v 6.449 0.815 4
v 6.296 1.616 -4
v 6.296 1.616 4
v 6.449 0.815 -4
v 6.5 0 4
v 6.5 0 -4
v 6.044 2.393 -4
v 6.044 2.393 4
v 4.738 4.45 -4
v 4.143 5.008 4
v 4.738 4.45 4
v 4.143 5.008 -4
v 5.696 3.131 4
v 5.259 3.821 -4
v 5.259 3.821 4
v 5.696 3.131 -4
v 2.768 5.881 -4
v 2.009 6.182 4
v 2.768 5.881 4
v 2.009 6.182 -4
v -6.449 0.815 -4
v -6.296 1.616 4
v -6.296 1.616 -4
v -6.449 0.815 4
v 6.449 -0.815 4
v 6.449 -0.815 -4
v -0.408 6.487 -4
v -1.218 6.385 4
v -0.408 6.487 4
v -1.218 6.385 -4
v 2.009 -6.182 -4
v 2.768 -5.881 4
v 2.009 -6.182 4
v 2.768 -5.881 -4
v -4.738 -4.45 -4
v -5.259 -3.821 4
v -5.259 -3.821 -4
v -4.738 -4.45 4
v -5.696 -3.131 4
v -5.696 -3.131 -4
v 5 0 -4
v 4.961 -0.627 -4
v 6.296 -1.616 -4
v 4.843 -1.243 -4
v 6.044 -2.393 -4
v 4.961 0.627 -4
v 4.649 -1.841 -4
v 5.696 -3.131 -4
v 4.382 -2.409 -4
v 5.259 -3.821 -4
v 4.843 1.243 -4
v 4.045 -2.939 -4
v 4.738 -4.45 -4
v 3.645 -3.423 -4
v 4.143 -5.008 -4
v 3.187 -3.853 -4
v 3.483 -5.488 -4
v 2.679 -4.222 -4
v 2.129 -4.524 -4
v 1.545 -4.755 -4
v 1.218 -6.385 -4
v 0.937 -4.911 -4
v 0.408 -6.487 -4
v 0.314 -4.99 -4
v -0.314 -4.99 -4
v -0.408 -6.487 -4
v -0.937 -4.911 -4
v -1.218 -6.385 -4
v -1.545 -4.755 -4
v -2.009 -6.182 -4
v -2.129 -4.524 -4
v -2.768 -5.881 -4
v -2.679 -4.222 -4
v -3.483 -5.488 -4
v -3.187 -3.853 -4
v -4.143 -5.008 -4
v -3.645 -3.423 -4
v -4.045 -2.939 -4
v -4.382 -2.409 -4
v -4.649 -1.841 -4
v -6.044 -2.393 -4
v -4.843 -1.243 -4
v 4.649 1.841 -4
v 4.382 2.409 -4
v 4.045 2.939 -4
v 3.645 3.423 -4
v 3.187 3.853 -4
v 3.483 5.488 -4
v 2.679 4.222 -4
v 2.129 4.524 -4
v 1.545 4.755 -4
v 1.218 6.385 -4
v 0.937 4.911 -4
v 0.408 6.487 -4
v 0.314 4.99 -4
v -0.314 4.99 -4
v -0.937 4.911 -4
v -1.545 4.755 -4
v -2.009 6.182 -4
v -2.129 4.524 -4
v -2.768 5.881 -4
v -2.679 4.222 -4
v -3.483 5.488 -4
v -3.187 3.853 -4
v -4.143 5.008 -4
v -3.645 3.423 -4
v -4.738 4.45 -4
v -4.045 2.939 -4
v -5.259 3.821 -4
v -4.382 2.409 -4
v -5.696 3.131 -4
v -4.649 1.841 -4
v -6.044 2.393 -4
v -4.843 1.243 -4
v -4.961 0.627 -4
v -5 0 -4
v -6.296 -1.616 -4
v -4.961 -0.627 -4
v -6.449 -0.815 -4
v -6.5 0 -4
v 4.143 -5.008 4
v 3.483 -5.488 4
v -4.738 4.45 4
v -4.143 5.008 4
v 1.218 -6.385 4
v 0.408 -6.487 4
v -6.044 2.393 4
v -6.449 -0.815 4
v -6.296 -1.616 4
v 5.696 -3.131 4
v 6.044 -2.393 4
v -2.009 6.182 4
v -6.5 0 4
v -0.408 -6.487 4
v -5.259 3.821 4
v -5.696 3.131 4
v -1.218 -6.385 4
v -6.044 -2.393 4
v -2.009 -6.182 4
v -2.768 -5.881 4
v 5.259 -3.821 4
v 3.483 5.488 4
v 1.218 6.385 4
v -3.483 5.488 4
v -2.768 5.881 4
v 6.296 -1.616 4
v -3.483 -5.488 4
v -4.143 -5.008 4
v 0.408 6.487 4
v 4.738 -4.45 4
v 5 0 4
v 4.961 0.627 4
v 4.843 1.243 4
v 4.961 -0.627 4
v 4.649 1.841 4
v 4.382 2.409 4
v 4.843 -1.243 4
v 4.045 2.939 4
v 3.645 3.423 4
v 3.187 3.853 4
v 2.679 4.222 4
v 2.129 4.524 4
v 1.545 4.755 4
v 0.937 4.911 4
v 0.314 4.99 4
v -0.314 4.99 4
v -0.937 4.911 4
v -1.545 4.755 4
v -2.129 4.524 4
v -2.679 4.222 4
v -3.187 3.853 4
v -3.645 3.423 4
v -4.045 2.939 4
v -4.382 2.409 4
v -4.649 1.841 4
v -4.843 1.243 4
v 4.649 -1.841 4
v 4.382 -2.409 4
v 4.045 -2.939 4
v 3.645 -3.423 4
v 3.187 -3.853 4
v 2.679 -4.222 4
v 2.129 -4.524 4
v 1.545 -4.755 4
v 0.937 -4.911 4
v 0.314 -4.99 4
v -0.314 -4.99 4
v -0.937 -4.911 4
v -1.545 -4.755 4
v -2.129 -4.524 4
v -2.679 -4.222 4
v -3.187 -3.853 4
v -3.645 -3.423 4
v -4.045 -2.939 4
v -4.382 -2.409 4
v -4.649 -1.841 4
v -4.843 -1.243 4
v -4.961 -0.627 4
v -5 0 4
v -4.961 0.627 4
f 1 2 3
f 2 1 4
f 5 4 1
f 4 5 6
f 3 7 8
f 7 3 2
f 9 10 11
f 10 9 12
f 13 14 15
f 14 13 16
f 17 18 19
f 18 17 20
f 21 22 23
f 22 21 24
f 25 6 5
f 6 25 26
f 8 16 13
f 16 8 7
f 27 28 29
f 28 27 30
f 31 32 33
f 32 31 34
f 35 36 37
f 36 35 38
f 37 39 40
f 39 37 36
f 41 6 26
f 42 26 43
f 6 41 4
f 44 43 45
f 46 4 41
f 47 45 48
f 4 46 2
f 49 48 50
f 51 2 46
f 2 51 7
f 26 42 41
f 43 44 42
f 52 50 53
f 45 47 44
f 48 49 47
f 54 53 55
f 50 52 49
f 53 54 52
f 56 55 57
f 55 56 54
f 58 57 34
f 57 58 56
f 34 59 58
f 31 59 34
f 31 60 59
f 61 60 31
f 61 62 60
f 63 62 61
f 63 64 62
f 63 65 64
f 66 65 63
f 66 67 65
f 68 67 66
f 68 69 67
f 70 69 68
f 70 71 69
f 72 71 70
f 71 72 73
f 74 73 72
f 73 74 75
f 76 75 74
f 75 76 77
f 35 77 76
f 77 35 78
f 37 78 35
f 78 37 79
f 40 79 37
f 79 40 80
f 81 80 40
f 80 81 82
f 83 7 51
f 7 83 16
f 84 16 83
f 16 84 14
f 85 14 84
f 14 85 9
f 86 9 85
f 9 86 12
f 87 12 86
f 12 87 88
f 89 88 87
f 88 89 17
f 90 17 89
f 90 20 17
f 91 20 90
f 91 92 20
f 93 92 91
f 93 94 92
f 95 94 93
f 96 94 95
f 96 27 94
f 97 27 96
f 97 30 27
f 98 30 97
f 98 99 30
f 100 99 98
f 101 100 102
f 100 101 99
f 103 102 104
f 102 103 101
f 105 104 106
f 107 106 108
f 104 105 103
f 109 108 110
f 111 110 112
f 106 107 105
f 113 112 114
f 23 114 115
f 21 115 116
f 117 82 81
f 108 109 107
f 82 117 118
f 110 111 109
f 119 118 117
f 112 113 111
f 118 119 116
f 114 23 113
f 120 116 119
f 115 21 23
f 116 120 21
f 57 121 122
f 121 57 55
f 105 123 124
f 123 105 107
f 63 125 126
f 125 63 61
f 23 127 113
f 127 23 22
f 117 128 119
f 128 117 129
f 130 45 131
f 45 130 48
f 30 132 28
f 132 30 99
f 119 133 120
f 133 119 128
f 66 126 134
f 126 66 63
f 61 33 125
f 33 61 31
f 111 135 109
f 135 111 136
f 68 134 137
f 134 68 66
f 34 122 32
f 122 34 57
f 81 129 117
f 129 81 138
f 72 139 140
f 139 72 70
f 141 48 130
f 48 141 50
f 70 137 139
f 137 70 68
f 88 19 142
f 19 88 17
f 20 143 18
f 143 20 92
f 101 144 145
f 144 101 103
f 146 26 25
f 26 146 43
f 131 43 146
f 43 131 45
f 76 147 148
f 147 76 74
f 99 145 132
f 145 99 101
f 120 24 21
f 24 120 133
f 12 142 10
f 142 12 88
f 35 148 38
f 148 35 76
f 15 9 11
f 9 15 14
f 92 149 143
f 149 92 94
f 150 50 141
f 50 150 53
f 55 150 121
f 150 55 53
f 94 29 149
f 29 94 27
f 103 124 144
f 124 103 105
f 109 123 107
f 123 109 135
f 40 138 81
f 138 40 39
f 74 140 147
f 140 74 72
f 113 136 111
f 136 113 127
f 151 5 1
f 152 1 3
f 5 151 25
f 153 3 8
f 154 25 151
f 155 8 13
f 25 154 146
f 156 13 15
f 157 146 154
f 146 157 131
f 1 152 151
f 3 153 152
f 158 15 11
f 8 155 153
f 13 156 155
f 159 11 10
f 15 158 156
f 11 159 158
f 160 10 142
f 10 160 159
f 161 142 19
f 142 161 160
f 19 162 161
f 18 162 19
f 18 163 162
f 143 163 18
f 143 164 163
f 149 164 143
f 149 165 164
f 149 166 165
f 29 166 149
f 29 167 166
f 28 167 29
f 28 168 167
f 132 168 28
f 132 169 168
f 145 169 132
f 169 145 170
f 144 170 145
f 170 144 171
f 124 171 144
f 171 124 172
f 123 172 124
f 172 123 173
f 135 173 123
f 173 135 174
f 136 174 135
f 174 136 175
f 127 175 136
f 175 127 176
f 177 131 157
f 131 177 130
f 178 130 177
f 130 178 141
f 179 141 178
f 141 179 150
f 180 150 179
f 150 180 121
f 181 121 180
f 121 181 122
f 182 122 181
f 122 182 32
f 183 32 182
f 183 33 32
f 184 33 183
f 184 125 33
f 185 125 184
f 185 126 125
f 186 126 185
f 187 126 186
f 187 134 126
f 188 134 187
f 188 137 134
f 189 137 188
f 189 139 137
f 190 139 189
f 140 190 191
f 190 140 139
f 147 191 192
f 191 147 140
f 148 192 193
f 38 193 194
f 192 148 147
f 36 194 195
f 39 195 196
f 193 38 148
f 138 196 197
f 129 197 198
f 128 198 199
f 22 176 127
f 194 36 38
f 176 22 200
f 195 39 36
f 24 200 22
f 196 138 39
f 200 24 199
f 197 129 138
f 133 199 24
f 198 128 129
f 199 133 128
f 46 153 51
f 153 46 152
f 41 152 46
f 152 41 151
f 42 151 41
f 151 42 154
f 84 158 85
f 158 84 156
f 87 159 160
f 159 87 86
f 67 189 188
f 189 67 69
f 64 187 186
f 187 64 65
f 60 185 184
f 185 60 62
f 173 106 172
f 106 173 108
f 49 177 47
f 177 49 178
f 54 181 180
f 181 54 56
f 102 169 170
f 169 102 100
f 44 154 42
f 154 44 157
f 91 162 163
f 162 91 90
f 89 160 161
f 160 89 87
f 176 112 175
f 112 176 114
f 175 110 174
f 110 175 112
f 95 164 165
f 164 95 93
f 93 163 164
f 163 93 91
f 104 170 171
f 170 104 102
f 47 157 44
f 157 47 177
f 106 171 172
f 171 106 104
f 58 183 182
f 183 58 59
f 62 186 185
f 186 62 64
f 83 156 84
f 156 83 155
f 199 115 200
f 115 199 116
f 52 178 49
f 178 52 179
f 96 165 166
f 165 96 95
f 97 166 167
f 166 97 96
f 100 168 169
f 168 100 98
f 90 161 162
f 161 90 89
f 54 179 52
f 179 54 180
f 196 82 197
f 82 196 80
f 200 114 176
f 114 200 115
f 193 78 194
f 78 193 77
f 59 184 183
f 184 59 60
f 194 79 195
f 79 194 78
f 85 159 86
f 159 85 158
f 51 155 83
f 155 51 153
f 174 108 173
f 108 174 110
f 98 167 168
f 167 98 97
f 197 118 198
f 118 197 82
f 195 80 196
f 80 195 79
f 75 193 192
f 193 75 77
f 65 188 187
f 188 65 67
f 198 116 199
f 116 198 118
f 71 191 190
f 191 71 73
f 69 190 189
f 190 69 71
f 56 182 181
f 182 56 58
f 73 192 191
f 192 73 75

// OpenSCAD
$fn = 50;


difference() {
	union() {
		translate(v = [0, 0, -4.0000000000]) {
			cylinder(h = 8, r = 6.5000000000);
		}
	}
	union() {
		translate(v = [0, 0, -100.0000000000]) {
			cylinder(h = 200, r = 5.0000000000);
		}
	}
}
